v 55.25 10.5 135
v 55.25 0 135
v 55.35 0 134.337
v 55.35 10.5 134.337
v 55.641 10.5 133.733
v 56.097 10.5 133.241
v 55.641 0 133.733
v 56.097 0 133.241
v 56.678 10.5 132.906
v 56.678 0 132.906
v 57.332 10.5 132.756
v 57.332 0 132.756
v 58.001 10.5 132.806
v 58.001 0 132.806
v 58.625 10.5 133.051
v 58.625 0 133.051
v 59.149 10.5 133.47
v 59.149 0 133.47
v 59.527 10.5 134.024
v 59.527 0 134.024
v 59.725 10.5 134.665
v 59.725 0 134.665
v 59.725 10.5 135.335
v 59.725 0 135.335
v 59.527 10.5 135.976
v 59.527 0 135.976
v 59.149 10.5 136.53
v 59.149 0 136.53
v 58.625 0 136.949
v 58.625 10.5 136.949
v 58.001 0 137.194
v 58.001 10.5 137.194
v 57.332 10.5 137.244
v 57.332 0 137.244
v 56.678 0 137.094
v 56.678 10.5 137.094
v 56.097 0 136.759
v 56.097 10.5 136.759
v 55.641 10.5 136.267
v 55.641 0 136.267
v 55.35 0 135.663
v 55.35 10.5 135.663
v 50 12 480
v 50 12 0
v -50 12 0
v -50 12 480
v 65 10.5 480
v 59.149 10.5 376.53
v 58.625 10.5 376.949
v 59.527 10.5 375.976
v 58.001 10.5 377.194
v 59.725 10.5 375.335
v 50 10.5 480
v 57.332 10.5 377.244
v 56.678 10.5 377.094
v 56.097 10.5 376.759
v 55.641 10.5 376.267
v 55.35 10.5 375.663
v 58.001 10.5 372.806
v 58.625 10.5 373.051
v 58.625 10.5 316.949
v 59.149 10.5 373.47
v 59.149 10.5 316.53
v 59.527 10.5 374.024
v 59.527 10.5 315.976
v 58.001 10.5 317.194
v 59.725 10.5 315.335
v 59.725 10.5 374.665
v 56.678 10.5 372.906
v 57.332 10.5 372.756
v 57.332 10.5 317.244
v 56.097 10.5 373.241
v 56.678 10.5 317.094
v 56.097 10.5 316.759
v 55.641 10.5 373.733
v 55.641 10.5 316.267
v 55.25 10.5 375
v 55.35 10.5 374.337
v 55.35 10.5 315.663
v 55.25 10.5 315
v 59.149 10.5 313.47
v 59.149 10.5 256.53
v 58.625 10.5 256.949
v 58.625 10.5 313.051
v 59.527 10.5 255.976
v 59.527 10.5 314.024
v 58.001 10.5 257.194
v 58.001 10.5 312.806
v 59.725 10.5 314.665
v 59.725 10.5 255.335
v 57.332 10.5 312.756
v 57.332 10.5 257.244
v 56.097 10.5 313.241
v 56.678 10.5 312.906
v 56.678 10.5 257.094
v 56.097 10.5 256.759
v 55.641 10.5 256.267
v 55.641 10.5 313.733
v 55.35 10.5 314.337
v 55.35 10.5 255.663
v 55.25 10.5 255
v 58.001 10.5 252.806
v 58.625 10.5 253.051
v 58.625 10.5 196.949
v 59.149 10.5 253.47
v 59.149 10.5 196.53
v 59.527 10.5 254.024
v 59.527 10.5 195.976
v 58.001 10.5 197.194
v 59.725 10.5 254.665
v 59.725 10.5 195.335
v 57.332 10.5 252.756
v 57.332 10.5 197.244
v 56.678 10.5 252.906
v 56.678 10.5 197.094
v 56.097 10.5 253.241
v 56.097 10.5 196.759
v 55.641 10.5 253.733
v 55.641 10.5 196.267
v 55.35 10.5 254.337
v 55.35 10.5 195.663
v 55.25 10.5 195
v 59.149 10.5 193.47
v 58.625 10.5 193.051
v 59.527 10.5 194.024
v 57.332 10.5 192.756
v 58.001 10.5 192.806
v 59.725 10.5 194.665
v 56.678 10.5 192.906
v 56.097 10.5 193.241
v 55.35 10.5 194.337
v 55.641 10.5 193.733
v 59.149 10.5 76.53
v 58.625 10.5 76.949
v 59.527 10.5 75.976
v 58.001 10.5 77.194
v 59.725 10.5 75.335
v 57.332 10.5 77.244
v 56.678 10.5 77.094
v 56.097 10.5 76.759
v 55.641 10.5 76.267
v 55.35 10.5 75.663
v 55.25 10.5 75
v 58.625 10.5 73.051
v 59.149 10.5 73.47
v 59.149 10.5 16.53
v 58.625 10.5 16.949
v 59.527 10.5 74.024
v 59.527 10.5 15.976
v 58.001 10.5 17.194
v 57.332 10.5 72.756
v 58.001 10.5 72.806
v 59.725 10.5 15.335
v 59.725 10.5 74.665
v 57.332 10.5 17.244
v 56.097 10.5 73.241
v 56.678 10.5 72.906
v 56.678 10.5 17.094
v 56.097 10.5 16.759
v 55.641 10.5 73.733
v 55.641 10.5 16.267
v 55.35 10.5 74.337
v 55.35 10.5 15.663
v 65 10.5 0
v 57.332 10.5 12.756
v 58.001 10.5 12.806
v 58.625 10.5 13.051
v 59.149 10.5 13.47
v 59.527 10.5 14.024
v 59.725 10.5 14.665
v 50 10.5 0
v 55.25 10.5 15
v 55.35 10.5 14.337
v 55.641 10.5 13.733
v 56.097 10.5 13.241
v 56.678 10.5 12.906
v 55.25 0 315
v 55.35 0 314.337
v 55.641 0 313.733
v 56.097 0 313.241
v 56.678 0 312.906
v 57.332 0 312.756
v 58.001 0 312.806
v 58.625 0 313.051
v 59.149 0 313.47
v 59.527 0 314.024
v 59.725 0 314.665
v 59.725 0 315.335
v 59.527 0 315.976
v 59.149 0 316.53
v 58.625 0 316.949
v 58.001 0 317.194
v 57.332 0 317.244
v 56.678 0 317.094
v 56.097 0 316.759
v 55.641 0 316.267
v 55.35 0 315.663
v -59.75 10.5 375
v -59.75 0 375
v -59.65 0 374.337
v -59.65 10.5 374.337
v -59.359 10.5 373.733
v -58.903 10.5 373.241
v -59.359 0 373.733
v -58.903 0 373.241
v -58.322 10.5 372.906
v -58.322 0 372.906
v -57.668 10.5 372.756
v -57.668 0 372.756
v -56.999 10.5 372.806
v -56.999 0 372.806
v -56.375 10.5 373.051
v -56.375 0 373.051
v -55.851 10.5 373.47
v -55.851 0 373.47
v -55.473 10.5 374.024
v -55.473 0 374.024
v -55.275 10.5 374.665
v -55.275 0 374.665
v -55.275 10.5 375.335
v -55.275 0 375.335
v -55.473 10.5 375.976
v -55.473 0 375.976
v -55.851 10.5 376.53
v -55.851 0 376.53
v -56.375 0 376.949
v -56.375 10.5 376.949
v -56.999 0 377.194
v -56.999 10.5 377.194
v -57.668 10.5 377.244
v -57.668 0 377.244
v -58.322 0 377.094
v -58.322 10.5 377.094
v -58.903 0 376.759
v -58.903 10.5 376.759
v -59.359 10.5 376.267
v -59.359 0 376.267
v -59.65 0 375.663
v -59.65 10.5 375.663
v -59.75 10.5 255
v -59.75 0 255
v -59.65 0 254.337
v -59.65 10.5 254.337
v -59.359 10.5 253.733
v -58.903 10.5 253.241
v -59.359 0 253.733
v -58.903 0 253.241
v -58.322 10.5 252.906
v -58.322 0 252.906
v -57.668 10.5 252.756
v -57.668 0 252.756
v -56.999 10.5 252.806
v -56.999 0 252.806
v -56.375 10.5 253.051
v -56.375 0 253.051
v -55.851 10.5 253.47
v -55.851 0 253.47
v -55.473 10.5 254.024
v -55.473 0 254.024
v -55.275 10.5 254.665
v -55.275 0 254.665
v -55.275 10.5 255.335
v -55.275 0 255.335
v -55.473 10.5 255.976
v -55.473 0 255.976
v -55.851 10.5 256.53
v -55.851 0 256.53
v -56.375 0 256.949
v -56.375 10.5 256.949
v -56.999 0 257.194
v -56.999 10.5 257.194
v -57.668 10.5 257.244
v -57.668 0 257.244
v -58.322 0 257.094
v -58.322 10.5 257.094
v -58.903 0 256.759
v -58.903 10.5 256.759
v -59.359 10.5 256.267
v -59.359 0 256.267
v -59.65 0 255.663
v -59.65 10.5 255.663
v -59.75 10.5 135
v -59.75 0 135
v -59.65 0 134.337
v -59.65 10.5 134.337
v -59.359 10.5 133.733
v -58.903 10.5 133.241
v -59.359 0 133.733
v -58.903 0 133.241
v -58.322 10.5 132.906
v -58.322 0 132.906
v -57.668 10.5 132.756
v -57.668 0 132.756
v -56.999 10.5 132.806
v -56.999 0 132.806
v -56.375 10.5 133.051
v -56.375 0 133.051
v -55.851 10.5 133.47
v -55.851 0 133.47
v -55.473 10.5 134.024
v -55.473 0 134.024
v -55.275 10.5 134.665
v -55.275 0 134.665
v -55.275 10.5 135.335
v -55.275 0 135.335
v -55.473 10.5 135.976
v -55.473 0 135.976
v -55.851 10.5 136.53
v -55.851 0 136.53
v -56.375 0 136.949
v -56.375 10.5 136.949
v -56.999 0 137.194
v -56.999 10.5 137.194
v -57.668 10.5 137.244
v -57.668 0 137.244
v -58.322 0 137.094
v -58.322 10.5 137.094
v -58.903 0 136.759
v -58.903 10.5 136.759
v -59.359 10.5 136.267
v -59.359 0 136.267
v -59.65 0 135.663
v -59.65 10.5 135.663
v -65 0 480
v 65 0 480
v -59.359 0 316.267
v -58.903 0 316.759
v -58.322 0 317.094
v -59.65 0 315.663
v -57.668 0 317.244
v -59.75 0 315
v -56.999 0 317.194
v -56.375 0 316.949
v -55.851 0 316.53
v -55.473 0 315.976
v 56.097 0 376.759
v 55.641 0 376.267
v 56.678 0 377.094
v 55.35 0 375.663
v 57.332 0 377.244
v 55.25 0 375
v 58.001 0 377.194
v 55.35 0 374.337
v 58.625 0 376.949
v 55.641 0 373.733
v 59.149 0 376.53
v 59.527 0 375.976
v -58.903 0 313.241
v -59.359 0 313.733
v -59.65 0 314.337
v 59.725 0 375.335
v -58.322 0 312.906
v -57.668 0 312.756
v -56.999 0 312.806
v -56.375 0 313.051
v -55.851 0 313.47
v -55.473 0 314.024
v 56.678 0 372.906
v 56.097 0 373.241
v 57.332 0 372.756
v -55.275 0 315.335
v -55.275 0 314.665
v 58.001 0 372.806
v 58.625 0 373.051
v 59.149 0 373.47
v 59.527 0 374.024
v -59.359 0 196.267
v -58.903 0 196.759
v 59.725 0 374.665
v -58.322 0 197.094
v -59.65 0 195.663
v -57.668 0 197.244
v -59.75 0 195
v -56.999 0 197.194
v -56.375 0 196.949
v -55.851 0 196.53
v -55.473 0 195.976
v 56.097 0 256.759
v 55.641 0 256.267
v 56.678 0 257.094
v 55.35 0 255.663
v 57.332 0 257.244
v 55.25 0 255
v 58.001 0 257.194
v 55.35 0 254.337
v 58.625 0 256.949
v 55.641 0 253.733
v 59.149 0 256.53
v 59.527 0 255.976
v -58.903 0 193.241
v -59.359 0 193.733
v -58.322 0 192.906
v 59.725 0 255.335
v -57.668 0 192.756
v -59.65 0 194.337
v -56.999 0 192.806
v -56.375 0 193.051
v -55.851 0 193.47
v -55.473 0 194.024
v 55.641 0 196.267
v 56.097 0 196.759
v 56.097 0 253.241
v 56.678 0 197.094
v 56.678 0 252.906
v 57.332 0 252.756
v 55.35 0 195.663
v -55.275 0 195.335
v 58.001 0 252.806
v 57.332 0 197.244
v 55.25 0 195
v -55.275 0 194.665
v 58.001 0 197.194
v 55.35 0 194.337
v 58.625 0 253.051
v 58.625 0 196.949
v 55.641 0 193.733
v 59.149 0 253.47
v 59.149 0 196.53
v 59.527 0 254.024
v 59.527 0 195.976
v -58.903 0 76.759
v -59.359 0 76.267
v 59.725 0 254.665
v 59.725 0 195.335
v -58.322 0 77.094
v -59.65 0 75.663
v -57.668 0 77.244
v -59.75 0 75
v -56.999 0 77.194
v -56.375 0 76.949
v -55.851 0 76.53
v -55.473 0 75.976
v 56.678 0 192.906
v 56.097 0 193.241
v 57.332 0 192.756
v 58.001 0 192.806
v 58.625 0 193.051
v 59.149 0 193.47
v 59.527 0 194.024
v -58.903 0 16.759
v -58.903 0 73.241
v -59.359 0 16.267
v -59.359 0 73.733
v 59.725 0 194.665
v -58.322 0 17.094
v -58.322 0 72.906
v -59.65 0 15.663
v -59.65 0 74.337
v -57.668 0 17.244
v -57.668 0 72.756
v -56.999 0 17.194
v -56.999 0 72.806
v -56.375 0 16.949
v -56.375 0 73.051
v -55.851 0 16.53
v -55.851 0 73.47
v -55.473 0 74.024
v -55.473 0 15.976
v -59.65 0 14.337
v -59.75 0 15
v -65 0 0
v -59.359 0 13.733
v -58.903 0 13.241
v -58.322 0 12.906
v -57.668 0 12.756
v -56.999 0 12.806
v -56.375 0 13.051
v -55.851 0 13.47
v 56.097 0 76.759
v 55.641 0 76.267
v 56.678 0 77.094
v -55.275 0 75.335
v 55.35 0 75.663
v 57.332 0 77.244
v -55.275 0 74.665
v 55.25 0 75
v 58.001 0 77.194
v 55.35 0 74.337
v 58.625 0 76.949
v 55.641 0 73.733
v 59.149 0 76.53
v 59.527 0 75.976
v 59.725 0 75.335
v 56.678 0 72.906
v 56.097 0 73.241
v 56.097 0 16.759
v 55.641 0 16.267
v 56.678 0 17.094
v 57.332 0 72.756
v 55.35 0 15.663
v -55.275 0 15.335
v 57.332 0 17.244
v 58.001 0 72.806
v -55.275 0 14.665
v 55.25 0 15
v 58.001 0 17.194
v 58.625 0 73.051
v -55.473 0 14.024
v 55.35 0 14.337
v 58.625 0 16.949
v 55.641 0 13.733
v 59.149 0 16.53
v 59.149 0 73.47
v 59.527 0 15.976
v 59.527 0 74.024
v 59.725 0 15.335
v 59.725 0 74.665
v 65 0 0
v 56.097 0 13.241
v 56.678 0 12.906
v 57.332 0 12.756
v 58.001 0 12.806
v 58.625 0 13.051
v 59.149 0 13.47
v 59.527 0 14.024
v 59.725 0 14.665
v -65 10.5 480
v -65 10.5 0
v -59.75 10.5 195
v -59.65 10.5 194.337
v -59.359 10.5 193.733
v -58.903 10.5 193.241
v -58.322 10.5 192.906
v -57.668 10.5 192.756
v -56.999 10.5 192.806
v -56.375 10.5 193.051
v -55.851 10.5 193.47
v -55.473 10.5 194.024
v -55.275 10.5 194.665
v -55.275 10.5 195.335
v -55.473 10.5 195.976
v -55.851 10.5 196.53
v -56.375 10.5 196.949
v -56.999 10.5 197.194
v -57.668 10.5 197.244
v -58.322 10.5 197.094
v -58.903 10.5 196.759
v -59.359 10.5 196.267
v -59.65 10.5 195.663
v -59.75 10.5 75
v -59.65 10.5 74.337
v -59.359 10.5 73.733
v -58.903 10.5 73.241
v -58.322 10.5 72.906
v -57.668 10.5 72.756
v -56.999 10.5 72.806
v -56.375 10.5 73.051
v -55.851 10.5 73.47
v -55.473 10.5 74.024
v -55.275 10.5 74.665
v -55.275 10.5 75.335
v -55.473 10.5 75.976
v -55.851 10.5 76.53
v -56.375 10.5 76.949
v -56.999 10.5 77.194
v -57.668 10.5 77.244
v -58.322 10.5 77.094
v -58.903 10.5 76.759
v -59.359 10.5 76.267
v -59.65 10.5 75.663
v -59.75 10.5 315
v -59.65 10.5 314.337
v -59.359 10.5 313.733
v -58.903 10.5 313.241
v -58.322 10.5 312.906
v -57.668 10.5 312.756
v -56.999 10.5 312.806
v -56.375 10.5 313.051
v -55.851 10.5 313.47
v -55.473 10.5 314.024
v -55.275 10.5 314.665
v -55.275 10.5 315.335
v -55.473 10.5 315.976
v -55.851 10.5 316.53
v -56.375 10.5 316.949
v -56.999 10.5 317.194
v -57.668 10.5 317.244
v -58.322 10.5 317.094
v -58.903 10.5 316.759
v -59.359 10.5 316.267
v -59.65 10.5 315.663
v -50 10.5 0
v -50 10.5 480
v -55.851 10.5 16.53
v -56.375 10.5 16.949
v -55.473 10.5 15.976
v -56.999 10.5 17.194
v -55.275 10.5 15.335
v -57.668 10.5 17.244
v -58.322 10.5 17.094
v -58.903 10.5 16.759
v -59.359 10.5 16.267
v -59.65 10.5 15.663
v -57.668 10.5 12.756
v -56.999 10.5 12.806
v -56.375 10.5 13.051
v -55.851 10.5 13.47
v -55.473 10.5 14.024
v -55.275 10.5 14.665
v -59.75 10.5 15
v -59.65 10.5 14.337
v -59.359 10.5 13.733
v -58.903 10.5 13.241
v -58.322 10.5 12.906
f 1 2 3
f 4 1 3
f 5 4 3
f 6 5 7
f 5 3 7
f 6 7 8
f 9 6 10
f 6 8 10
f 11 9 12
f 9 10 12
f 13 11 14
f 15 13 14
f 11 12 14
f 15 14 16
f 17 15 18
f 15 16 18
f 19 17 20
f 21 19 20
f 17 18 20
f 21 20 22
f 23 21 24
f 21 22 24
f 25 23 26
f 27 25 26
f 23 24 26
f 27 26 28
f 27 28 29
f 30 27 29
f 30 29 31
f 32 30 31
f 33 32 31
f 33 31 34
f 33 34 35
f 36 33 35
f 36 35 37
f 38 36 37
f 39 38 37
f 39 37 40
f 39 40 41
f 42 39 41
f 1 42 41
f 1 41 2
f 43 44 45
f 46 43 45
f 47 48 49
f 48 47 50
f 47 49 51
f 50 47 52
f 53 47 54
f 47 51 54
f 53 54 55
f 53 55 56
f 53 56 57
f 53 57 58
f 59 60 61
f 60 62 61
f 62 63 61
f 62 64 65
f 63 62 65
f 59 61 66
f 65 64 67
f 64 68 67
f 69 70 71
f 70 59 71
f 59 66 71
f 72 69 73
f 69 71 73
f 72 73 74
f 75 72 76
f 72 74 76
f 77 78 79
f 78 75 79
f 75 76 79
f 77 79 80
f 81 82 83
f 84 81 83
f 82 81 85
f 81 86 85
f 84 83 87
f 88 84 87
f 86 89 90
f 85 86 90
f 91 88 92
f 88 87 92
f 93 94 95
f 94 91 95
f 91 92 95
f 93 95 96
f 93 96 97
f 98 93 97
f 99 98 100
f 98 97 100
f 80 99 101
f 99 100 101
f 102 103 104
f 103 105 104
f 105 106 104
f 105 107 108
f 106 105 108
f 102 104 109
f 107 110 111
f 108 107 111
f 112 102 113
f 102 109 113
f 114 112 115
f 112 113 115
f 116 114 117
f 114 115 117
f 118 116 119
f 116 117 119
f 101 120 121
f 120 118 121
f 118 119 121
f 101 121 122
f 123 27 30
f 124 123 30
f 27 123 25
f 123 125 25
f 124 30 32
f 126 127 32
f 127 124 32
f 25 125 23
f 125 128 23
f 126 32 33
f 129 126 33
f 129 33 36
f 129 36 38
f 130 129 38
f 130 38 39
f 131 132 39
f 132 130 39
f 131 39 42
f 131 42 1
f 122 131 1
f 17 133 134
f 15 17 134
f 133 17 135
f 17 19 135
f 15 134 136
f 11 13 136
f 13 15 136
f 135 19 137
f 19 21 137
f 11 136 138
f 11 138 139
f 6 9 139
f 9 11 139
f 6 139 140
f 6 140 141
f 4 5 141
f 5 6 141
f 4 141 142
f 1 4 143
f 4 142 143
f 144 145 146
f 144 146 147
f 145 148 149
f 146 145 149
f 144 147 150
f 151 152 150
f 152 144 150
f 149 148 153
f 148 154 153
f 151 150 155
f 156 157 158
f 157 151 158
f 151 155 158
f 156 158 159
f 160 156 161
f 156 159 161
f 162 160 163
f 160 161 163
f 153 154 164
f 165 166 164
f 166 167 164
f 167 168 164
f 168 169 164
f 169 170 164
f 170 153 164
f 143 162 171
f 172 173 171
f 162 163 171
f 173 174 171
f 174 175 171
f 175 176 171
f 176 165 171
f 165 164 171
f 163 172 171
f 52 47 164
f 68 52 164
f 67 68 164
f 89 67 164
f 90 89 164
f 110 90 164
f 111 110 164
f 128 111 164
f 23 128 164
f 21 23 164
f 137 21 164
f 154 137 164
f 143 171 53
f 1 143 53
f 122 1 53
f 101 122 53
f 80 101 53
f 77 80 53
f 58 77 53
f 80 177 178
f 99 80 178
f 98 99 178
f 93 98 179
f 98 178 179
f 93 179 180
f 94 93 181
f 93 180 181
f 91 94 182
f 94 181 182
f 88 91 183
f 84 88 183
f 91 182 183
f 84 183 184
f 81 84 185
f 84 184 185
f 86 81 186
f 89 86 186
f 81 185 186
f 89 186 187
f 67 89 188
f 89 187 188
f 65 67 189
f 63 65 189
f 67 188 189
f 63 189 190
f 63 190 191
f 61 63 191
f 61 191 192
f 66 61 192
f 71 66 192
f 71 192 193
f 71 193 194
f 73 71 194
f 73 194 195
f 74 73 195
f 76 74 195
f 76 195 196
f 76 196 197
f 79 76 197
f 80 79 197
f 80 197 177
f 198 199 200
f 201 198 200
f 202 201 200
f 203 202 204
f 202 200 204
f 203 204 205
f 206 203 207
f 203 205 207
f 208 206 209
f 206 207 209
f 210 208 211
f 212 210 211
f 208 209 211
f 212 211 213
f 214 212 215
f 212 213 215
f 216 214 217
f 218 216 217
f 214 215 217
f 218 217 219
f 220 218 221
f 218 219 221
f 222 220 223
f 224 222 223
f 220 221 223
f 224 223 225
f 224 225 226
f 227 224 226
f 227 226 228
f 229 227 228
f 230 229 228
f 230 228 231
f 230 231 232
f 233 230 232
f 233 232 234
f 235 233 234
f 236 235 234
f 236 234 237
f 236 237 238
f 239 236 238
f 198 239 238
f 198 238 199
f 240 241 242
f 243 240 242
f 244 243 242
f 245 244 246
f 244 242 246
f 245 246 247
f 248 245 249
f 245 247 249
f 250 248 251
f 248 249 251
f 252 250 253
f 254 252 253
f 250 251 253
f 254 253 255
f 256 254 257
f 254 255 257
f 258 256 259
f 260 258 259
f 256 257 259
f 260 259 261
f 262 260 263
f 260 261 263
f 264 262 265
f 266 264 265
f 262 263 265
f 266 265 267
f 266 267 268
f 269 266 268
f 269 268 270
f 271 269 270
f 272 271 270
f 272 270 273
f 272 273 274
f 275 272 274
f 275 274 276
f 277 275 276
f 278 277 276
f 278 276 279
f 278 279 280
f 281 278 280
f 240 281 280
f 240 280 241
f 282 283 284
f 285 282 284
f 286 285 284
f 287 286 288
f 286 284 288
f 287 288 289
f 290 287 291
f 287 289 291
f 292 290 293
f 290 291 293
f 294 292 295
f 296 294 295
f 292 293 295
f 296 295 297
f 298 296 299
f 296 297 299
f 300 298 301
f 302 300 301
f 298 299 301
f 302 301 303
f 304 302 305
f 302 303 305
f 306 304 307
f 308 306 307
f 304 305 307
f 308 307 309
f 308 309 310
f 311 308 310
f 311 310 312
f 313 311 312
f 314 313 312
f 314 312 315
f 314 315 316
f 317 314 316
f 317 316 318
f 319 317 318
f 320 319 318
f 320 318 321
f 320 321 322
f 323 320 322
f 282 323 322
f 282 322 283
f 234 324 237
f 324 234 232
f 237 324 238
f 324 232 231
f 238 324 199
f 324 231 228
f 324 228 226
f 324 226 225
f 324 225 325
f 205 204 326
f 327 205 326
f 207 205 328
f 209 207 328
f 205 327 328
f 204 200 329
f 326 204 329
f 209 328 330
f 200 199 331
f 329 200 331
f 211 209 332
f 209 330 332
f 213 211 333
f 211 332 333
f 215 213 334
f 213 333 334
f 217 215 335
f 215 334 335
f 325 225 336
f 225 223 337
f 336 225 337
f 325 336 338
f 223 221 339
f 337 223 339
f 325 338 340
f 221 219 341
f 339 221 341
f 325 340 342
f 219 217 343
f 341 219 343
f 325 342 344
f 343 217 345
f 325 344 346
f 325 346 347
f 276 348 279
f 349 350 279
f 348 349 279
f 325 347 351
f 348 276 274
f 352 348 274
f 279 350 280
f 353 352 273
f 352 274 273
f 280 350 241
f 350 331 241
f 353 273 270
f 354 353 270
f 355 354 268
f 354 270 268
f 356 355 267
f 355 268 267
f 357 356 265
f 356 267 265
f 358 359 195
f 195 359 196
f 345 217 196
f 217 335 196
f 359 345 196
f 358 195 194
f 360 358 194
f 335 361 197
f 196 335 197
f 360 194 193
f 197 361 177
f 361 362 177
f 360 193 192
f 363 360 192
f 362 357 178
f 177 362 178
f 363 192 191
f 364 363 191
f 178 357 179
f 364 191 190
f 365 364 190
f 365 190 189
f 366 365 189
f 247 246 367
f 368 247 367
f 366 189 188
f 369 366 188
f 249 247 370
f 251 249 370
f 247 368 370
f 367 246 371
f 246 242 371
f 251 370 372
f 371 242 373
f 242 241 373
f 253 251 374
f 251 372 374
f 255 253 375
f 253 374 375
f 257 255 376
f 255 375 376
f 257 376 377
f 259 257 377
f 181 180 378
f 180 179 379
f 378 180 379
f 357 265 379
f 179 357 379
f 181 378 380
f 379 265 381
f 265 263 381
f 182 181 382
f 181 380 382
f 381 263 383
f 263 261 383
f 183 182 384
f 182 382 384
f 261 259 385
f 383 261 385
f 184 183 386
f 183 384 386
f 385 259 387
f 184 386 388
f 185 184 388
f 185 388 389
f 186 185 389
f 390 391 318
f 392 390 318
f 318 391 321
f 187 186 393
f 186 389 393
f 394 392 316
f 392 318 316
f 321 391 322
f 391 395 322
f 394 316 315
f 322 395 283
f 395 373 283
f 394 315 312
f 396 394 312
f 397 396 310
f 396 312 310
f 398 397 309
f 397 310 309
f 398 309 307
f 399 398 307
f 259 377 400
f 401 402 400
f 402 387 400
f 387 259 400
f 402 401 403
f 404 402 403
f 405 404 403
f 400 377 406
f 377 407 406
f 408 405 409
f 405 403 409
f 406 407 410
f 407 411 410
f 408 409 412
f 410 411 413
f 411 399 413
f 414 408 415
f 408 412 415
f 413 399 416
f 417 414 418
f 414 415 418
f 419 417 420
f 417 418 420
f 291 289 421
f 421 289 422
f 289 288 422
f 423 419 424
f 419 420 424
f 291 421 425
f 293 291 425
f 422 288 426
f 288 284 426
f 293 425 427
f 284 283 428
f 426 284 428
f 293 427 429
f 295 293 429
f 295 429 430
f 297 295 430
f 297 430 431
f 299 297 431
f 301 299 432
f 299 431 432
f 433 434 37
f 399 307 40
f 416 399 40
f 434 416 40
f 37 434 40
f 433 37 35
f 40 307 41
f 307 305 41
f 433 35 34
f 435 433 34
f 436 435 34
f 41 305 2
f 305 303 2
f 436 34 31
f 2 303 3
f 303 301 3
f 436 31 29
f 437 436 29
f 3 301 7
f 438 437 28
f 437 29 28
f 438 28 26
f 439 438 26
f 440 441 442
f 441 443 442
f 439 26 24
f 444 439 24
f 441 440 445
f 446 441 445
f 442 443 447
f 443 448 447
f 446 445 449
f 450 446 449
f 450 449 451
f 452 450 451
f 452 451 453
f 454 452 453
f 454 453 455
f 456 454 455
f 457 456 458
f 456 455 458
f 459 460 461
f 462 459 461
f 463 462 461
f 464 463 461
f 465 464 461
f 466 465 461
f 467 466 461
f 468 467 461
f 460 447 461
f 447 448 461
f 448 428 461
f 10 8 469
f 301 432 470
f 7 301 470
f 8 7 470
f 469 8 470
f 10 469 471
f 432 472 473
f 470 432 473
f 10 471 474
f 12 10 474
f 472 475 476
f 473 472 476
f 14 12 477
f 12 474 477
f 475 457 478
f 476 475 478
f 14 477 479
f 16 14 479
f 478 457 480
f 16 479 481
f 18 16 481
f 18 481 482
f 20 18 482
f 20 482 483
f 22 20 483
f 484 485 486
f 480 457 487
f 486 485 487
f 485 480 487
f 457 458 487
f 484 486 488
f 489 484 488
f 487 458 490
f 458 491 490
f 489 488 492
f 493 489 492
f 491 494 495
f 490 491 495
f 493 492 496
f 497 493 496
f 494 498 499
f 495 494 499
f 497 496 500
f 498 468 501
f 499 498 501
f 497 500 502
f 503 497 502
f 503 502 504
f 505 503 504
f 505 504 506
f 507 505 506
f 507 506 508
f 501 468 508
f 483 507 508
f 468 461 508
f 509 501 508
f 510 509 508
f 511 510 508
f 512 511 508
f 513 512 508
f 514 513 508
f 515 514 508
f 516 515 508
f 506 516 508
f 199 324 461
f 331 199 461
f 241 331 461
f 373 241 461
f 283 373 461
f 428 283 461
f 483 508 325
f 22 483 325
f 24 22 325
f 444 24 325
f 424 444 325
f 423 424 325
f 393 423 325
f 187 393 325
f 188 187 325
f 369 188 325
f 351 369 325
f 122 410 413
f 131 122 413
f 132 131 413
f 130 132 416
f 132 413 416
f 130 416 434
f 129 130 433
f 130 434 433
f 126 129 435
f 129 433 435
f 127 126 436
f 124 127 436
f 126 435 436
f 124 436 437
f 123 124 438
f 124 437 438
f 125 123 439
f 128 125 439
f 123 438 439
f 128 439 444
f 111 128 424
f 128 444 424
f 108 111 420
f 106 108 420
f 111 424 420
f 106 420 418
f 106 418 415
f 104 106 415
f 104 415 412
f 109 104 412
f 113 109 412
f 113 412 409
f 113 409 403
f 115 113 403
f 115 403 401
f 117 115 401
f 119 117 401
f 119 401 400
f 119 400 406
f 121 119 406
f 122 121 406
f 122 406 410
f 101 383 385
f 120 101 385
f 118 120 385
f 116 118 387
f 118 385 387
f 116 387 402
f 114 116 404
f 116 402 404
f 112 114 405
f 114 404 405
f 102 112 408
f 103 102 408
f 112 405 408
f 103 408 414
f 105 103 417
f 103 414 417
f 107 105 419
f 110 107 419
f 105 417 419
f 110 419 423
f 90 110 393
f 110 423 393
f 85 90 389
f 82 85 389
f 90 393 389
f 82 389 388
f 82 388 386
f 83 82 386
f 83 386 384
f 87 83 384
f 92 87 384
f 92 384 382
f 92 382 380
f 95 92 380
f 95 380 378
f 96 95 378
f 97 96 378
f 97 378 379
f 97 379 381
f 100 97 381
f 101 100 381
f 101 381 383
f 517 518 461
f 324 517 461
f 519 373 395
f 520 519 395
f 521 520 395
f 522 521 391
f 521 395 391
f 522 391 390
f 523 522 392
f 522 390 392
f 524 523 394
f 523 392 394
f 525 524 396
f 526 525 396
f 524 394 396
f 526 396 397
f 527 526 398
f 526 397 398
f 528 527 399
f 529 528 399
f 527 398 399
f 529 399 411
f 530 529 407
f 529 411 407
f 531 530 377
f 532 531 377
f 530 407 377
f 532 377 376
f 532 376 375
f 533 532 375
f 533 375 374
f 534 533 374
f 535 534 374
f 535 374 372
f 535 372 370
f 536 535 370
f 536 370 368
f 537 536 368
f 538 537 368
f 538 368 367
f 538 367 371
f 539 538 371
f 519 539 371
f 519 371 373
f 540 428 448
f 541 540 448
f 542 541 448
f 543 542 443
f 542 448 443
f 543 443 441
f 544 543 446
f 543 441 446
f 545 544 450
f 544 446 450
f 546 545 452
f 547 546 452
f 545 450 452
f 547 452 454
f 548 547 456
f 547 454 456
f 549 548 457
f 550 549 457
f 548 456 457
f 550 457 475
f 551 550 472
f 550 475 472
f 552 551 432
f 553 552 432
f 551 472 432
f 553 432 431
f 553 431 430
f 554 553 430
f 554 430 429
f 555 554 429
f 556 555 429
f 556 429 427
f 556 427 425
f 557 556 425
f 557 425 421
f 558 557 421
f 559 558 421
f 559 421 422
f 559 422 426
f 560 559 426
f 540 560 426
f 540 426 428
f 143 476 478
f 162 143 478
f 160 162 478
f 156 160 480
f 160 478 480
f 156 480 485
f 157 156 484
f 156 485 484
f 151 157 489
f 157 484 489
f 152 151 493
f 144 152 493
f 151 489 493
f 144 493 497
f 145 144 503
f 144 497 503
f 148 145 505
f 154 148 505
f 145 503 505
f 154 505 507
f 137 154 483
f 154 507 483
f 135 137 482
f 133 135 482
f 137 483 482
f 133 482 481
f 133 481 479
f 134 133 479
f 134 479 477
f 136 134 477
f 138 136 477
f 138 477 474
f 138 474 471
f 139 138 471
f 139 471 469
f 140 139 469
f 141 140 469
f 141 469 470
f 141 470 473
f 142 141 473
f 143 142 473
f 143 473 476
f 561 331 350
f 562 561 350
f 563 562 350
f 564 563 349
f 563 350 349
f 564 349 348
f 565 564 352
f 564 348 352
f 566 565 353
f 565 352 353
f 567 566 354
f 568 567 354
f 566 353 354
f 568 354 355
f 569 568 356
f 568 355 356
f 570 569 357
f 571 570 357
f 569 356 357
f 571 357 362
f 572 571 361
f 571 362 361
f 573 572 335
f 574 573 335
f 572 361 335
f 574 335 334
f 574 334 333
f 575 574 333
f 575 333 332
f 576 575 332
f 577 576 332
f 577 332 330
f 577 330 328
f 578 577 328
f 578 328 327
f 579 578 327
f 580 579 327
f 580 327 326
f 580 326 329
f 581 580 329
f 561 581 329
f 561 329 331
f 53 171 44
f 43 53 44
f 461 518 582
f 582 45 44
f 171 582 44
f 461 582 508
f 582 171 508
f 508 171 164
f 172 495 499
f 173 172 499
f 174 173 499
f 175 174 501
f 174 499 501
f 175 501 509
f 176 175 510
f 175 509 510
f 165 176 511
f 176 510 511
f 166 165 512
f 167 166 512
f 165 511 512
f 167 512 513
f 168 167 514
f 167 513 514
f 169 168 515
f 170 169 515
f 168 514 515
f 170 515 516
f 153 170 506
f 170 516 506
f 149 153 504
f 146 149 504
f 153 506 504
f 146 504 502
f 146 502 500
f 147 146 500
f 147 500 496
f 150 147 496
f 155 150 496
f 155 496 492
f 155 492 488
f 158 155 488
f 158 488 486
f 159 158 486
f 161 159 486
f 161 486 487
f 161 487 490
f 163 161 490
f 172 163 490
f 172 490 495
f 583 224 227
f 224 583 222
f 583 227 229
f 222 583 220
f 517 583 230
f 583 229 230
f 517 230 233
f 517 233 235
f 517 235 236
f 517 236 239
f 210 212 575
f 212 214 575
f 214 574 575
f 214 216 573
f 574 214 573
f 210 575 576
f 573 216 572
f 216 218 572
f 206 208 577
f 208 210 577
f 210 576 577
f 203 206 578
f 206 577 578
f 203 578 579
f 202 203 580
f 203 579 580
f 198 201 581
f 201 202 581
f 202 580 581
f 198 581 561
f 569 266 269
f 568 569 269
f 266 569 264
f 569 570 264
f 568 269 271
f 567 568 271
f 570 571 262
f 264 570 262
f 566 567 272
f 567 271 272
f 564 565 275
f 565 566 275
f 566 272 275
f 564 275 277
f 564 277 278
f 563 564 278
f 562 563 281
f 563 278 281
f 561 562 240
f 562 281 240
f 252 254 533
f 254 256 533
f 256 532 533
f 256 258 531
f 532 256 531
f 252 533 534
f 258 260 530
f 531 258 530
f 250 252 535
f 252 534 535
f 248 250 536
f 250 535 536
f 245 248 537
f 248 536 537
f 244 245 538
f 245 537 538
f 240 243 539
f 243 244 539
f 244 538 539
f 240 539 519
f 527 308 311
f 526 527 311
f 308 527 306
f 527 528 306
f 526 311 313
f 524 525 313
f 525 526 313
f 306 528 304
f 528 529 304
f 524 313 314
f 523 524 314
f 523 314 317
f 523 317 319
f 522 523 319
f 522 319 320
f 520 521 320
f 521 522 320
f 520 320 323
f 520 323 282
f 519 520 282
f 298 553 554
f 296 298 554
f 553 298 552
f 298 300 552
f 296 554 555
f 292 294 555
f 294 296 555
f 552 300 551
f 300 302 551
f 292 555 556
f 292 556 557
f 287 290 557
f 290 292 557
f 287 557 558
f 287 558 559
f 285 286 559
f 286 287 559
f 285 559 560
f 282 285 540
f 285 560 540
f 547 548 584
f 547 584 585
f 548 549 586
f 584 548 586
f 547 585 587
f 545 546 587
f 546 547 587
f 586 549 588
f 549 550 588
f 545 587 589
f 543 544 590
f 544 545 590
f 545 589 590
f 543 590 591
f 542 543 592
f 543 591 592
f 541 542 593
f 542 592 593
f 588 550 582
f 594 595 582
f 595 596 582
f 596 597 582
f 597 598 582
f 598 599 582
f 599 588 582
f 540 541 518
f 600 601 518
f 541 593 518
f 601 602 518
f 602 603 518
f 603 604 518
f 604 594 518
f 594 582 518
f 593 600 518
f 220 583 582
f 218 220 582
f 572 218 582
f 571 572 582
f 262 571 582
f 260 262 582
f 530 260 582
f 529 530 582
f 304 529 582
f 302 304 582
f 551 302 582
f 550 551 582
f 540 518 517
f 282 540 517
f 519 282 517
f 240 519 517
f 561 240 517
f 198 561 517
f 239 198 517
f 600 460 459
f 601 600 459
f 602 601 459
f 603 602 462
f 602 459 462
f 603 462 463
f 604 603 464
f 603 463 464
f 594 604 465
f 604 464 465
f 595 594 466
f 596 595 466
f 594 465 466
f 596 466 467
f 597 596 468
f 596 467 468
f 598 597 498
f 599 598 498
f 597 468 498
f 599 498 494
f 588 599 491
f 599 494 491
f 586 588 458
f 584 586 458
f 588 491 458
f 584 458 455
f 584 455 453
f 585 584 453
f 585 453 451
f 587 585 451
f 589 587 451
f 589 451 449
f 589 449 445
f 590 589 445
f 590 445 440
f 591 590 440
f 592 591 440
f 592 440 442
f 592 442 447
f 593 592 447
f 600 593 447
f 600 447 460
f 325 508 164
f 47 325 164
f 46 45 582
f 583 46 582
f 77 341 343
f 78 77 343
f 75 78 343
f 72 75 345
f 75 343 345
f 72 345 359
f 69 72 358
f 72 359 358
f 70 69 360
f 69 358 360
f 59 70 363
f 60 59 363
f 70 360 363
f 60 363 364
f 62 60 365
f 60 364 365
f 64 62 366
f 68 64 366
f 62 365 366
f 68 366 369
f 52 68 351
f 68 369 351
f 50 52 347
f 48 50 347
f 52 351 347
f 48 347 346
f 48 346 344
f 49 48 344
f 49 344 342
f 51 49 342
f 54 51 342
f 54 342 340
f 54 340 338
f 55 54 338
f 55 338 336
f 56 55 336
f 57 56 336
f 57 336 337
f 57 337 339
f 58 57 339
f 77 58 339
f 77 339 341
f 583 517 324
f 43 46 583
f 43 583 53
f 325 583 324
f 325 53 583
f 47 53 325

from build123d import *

# Parameters (mm, degrees)
BOSS_EXTRUDE1_DEPTH  = 480
M4_CLEARANCE_HOLE1_D = 4.5
M4_CLEARANCE_HOLE2_D = 4.5


with BuildPart() as part:
    # Sketch1 → Boss-Extrude1 (new body)
    with BuildSketch(Plane.XY):
        Polygon((-65, 0), (65, 0), (65, 10.5), (50, 10.5), (50, 12), (-50, 12), (-50, 10.5), (-65, 10.5), align=None)
    extrude(amount=BOSS_EXTRUDE1_DEPTH)

    # M4 Clearance Hole1 (through all)
    with Locations(Plane(origin=(14.850423209, 10.5, 240), x_dir=(1, 0, 0), z_dir=(0, 1, 0))):
        with Locations((-72.350423209, -135), (-72.350423209, 225), (-72.350423209, -75), (-72.350423209, -15), (-72.350423209, 45), (-72.350423209, 105), (-72.350423209, 165)):
            Hole(M4_CLEARANCE_HOLE1_D / 2)

    # M4 Clearance Hole2 (through all)
    with Locations(Plane(origin=(14.850423209, 10.5, 240), x_dir=(1, 0, 0), z_dir=(0, 1, 0))):
        with Locations((42.649576791, -135), (42.649576791, 225), (42.649576791, -75), (42.649576791, -15), (42.649576791, 45), (42.649576791, 105), (42.649576791, 165)):
            Hole(M4_CLEARANCE_HOLE2_D / 2)


solid = part.part
